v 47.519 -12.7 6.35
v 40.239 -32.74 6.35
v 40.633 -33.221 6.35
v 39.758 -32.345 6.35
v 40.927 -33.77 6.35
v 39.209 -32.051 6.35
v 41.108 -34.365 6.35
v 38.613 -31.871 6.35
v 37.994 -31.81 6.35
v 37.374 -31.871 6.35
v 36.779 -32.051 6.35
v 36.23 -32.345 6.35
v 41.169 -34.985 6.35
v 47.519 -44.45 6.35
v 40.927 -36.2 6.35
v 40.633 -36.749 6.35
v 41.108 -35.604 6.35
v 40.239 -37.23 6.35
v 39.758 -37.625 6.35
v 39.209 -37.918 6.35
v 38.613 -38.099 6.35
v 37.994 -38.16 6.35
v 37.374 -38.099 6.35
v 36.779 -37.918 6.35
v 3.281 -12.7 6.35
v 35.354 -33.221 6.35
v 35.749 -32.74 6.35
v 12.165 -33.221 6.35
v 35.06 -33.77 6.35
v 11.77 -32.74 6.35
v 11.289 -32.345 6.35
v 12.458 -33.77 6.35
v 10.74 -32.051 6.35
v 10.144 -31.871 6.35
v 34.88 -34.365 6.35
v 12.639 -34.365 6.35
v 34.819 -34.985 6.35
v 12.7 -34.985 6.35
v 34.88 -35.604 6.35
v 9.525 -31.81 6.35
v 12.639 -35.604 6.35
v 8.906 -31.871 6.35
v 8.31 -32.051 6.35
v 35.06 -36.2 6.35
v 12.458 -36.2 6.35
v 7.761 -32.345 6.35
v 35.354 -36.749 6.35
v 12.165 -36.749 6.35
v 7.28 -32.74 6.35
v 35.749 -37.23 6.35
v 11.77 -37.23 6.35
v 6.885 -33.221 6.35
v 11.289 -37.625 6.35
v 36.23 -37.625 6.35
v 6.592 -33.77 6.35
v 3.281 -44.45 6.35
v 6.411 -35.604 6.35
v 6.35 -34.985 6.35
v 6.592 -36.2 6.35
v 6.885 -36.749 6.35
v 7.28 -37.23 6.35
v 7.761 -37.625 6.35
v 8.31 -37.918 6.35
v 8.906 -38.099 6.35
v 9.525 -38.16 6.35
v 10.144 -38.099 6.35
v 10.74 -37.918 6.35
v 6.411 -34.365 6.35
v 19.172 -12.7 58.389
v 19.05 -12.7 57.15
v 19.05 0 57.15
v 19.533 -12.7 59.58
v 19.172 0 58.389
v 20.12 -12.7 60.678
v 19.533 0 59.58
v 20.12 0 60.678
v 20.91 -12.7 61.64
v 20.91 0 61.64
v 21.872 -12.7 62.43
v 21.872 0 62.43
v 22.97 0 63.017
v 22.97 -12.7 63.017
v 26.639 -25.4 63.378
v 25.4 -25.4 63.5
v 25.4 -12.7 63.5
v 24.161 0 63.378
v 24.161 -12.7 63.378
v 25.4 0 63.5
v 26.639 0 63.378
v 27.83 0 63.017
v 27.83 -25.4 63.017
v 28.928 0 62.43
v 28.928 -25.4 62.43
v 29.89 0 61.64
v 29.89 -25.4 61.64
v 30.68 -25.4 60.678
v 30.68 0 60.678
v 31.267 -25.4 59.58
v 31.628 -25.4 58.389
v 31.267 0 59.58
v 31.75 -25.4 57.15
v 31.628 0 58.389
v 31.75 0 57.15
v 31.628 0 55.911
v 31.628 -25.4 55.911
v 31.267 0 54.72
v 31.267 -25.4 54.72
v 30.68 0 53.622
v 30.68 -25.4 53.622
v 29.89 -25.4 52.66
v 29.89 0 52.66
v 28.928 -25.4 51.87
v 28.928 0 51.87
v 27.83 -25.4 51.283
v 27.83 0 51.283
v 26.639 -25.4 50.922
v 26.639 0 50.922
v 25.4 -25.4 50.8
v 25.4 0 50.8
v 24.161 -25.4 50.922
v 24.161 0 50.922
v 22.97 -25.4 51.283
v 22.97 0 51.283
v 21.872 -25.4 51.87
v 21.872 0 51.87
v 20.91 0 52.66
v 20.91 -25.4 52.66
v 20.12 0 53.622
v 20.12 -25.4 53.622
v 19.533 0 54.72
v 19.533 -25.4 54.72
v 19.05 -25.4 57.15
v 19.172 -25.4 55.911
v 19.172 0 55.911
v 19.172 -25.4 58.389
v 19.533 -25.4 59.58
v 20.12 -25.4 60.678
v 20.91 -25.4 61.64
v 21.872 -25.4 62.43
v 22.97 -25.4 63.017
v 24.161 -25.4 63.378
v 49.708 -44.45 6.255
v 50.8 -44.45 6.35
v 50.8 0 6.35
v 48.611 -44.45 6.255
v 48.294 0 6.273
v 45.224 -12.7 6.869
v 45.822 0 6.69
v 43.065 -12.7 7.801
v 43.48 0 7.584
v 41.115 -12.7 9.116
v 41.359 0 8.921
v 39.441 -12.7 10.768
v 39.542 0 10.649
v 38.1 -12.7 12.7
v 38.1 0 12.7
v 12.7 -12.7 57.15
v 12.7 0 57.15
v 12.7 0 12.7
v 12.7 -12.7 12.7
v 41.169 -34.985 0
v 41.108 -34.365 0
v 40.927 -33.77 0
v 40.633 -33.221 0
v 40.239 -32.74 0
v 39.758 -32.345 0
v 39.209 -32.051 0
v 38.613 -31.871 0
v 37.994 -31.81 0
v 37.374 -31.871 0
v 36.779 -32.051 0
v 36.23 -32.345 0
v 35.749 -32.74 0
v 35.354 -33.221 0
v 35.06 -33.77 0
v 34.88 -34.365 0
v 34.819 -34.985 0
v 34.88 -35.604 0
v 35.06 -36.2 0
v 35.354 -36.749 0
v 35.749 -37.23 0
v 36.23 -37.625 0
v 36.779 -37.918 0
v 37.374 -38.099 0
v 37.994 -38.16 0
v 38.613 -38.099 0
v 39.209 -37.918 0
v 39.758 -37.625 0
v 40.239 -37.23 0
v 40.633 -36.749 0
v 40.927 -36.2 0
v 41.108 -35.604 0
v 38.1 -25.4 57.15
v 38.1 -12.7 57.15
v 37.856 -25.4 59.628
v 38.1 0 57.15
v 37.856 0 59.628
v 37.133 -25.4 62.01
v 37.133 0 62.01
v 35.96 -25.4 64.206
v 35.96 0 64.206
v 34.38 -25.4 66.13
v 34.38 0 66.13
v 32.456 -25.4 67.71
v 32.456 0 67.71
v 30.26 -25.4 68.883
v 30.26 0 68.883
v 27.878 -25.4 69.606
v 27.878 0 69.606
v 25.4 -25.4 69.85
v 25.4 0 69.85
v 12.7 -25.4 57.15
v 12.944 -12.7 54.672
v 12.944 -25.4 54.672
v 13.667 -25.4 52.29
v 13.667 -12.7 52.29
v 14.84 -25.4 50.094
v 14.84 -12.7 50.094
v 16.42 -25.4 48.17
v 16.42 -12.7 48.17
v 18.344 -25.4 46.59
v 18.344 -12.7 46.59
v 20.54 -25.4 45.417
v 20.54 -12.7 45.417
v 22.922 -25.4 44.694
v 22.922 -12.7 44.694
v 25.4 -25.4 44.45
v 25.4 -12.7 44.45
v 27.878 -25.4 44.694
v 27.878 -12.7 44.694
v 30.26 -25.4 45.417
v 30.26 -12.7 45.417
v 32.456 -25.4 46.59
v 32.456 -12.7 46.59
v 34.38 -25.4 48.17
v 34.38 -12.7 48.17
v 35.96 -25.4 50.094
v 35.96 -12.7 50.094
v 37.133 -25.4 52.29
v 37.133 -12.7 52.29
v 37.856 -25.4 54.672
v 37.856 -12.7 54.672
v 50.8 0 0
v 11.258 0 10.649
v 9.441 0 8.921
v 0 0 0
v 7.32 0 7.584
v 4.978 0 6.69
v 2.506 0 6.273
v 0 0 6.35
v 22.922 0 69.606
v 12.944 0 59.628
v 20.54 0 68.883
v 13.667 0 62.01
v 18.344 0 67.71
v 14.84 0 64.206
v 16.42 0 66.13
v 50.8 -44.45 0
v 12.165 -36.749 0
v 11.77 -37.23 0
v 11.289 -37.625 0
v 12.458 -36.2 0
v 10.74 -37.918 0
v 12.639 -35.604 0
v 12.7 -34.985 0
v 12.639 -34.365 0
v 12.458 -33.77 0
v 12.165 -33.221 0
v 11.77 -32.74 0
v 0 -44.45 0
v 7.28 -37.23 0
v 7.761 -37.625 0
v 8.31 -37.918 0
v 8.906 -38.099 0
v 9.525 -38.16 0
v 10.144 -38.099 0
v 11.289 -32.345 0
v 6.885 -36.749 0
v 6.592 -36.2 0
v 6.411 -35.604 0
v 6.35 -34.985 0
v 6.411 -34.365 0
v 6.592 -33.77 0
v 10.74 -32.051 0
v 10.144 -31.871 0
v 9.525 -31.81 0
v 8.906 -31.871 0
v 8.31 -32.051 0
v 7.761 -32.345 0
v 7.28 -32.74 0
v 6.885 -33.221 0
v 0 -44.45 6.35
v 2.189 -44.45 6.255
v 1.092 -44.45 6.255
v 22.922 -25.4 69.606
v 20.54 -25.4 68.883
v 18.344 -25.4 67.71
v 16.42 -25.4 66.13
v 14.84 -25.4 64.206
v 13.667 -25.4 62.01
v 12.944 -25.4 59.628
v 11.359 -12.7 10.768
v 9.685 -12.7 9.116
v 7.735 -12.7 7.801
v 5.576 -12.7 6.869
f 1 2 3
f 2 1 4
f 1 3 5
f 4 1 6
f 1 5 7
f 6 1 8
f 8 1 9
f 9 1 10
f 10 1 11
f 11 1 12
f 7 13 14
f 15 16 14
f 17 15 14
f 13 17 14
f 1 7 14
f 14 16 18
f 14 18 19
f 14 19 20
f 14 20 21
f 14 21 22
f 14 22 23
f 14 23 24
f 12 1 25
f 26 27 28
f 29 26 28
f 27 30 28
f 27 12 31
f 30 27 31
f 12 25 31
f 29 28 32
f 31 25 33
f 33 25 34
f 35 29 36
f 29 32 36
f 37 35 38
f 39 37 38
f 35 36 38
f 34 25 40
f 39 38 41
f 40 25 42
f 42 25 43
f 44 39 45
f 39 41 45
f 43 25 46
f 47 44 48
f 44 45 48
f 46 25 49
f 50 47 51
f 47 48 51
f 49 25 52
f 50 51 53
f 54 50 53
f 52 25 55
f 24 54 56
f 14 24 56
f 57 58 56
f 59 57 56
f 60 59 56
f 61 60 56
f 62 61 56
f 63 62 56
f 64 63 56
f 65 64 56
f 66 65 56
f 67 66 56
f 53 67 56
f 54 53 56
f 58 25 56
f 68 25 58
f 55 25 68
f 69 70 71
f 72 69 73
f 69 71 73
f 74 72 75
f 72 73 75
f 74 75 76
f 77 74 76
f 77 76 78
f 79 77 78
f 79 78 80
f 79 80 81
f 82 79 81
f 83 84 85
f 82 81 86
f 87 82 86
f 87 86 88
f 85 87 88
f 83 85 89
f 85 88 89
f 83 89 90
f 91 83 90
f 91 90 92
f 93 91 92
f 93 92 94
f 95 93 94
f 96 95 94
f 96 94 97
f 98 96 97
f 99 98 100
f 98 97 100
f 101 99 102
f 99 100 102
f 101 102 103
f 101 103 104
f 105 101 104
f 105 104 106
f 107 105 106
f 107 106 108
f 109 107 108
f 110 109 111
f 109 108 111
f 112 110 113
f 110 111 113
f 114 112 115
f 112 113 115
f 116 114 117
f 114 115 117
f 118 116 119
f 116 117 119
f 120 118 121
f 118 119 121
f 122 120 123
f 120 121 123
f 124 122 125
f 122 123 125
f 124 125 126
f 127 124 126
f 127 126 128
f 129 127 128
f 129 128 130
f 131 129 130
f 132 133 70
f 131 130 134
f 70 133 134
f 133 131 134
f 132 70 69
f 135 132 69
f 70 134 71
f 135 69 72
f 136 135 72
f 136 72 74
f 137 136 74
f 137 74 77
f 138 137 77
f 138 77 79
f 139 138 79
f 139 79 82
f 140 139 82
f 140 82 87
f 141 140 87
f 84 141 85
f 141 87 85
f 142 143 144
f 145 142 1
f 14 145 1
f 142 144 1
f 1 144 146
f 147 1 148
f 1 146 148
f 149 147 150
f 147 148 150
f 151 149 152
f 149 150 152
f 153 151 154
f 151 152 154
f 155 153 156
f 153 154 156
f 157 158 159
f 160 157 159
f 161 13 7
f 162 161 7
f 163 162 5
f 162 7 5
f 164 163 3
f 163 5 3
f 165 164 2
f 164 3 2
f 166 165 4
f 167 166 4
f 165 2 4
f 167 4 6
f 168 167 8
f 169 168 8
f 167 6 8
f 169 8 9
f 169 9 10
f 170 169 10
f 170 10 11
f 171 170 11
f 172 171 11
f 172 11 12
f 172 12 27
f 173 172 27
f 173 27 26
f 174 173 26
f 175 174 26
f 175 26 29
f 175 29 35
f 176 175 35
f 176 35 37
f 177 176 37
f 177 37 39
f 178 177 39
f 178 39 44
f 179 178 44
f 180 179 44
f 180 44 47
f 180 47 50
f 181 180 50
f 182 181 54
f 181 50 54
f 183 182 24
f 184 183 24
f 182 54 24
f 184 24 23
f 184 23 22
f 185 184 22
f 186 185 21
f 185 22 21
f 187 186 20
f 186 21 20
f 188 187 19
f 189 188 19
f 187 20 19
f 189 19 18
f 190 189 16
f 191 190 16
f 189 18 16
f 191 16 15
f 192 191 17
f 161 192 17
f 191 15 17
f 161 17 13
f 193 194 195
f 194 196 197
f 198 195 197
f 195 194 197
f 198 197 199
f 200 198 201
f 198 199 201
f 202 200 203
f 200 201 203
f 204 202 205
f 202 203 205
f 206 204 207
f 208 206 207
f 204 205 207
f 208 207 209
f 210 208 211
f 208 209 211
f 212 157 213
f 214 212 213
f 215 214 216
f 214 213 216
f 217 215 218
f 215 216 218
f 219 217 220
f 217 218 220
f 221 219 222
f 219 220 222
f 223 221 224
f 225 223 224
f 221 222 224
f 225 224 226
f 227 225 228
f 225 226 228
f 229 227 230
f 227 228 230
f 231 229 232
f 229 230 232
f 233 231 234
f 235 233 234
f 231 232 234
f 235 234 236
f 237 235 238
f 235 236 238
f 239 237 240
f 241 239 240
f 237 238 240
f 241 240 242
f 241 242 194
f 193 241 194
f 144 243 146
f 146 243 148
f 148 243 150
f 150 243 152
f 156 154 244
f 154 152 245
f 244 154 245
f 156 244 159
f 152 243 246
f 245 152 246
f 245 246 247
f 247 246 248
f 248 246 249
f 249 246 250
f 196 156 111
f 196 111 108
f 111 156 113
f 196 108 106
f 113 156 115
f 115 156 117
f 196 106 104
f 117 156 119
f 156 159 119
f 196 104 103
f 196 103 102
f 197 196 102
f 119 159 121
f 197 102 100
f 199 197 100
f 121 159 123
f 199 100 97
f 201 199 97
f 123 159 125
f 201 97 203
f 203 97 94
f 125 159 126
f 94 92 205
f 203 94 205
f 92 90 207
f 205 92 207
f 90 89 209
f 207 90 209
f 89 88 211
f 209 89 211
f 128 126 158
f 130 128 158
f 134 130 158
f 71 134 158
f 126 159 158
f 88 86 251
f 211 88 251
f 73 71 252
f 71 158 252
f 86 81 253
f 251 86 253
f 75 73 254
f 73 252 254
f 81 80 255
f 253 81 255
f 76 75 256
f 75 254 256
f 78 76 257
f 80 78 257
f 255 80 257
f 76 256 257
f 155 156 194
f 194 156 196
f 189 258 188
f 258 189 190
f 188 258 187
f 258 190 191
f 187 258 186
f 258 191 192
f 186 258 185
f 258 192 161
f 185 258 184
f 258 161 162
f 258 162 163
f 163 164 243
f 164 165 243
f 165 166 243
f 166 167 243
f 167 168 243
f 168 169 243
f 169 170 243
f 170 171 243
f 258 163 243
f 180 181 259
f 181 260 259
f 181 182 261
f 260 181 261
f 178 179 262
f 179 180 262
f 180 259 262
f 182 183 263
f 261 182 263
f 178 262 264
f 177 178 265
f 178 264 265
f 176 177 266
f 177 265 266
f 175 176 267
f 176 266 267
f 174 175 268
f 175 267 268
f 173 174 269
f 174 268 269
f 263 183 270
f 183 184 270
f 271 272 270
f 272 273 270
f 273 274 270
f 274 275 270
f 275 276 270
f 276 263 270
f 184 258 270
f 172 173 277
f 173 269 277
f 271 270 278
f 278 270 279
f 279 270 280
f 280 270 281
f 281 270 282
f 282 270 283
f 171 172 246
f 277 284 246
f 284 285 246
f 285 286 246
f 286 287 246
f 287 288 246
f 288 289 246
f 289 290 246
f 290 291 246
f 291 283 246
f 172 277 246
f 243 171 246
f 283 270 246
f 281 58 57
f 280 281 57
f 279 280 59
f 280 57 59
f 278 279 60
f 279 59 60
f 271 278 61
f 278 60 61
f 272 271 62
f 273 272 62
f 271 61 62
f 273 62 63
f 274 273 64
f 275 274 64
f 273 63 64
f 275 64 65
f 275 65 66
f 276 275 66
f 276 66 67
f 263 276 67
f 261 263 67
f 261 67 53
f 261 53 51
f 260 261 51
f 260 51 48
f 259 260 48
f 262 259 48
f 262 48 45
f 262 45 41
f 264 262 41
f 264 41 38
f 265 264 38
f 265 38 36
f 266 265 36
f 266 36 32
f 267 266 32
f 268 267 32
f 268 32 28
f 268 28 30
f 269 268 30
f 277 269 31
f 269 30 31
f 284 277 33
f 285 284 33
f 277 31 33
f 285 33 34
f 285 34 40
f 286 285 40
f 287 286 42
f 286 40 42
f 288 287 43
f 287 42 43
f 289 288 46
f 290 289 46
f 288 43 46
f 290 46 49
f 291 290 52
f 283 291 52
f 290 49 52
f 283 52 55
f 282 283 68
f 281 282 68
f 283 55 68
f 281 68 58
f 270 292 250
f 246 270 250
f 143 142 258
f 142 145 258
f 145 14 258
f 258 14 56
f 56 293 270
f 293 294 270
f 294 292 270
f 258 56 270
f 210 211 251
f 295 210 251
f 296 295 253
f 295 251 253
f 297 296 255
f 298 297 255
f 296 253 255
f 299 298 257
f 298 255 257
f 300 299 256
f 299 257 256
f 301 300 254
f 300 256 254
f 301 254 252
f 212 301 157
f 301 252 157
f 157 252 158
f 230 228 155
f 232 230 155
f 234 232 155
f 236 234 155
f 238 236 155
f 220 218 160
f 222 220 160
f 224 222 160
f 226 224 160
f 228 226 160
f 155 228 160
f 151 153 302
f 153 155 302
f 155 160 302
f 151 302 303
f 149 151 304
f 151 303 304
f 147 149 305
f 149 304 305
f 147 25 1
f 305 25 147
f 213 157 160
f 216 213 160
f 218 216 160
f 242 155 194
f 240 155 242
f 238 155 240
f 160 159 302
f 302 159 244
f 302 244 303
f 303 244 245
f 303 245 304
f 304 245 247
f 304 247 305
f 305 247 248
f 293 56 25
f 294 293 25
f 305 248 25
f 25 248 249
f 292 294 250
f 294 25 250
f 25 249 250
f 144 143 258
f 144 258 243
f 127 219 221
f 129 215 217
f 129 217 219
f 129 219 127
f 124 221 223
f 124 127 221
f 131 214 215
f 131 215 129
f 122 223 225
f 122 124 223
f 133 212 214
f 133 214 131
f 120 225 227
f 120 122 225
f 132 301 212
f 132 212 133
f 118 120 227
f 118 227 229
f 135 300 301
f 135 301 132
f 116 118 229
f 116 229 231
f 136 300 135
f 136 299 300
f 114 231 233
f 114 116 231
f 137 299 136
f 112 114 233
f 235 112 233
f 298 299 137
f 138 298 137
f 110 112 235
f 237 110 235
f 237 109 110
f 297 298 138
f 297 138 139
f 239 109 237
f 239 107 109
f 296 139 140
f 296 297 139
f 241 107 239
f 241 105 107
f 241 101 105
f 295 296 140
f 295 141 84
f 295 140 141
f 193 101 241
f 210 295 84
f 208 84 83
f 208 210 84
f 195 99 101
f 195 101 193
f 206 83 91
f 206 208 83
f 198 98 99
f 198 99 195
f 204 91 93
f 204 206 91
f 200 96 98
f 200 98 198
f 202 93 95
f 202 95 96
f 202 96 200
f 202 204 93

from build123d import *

# Parameters (mm, degrees)
F1_DEPTH = 50.8
F3_DEPTH = 12.7
F5_R     = 3.175
F6_DEPTH = 6.351
F8_DEPTH = 6.351
F9_DEPTH = 44.451


with BuildPart() as f1:
    # F0 (on Right) → F1 (new body)
    with BuildSketch(Plane.YZ):
        Polygon((-44.45, 0), (0, 0), (0, 69.85), (-12.7, 69.85), (-12.7, 6.35), (-44.45, 6.35), align=None)
    extrude(amount=F1_DEPTH)

    # F2 (on face) → F3 (join)
    with BuildSketch(Plane.XZ.offset(12.7)):
        with BuildLine():
            ThreePointArc((38.1, 57.15), (34.3802561211, 66.1302561211), (25.4, 69.85))
            ThreePointArc((25.4, 69.85), (16.4197438789, 48.1697438789), (38.1, 57.15))
        make_face()
        with BuildLine():
            ThreePointArc((31.75, 57.15), (20.9098719395, 52.6598719395), (25.4, 63.5))
            ThreePointArc((25.4, 63.5), (29.8901280605, 61.6401280605), (31.75, 57.15))
        make_face(mode=Mode.SUBTRACT)
    extrude(amount=F3_DEPTH)

    # F5 (on face) → F6 (cut, through all)
    with BuildSketch(Plane.XY.offset(6.35)):
        with BuildLine():
            ThreePointArc((12.7, -34.9846648967), (9.525, -31.8096648967), (6.35, -34.9846648967))
            ThreePointArc((6.35, -34.9846648967), (9.525, -38.1596648967), (12.7, -34.9846648967))
        make_face()
        with Locations((37.9935720786, -34.9846648967)):
            Circle(F5_R)
    extrude(amount=-F6_DEPTH, mode=Mode.SUBTRACT)

    # F7 (on face) → F8 (cut, through all)
    with BuildSketch(Plane.XY.offset(6.35)):
        with BuildLine():
            Line((9.525, -38.1596648967), (9.525, -34.9846648967))
            Line((9.525, -34.9846648967), (6.35, -34.9846648967))
            ThreePointArc((6.35, -34.9846648967), (7.2799359697, -37.229728927), (9.525, -38.1596648967))
        make_face()
    extrude(amount=-F8_DEPTH, mode=Mode.SUBTRACT)

    # F4 (on face) → F9 (cut, through all)
    with BuildSketch(Plane(origin=(0, 0, 0), x_dir=(-1, 0, 0), z_dir=(0, 1, 0))):
        with BuildLine():
            ThreePointArc((-50.8, 6.35), (-43.4796733765, 7.5843467529), (-38.1, 12.7))
            Line((-38.1, 12.7), (-50.8, 12.7))
            Line((-50.8, 12.7), (-50.8, 6.35))
        make_face()
        with BuildLine():
            ThreePointArc((-38.1, 57.15), (-34.3802561211, 66.1302561211), (-25.4, 69.85))
            Line((-25.4, 69.85), (-50.8, 69.85))
            Line((-50.8, 69.85), (-50.8, 12.7))
            Line((-50.8, 12.7), (-38.1, 12.7))
            Line((-38.1, 12.7), (-38.1, 57.15))
        make_face()
        with BuildLine():
            Line((0, 69.85), (-25.4, 69.85))
            ThreePointArc((-25.4, 69.85), (-16.4197438789, 66.1302561211), (-12.7, 57.15))
            Line((-12.7, 57.15), (-12.7, 12.7))
            ThreePointArc((-12.7, 12.7), (-7.3203266235, 7.5843467529), (0, 6.35))
            Line((0, 6.35), (0, 69.85))
        make_face()
        with BuildLine():
            ThreePointArc((-19.05, 57.15), (-20.9098719395, 61.6401280605), (-25.4, 63.5))
            ThreePointArc((-25.4, 63.5), (-29.8901280605, 52.6598719395), (-19.05, 57.15))
        make_face()
    extrude(amount=-F9_DEPTH, mode=Mode.SUBTRACT)


solid = f1.part
